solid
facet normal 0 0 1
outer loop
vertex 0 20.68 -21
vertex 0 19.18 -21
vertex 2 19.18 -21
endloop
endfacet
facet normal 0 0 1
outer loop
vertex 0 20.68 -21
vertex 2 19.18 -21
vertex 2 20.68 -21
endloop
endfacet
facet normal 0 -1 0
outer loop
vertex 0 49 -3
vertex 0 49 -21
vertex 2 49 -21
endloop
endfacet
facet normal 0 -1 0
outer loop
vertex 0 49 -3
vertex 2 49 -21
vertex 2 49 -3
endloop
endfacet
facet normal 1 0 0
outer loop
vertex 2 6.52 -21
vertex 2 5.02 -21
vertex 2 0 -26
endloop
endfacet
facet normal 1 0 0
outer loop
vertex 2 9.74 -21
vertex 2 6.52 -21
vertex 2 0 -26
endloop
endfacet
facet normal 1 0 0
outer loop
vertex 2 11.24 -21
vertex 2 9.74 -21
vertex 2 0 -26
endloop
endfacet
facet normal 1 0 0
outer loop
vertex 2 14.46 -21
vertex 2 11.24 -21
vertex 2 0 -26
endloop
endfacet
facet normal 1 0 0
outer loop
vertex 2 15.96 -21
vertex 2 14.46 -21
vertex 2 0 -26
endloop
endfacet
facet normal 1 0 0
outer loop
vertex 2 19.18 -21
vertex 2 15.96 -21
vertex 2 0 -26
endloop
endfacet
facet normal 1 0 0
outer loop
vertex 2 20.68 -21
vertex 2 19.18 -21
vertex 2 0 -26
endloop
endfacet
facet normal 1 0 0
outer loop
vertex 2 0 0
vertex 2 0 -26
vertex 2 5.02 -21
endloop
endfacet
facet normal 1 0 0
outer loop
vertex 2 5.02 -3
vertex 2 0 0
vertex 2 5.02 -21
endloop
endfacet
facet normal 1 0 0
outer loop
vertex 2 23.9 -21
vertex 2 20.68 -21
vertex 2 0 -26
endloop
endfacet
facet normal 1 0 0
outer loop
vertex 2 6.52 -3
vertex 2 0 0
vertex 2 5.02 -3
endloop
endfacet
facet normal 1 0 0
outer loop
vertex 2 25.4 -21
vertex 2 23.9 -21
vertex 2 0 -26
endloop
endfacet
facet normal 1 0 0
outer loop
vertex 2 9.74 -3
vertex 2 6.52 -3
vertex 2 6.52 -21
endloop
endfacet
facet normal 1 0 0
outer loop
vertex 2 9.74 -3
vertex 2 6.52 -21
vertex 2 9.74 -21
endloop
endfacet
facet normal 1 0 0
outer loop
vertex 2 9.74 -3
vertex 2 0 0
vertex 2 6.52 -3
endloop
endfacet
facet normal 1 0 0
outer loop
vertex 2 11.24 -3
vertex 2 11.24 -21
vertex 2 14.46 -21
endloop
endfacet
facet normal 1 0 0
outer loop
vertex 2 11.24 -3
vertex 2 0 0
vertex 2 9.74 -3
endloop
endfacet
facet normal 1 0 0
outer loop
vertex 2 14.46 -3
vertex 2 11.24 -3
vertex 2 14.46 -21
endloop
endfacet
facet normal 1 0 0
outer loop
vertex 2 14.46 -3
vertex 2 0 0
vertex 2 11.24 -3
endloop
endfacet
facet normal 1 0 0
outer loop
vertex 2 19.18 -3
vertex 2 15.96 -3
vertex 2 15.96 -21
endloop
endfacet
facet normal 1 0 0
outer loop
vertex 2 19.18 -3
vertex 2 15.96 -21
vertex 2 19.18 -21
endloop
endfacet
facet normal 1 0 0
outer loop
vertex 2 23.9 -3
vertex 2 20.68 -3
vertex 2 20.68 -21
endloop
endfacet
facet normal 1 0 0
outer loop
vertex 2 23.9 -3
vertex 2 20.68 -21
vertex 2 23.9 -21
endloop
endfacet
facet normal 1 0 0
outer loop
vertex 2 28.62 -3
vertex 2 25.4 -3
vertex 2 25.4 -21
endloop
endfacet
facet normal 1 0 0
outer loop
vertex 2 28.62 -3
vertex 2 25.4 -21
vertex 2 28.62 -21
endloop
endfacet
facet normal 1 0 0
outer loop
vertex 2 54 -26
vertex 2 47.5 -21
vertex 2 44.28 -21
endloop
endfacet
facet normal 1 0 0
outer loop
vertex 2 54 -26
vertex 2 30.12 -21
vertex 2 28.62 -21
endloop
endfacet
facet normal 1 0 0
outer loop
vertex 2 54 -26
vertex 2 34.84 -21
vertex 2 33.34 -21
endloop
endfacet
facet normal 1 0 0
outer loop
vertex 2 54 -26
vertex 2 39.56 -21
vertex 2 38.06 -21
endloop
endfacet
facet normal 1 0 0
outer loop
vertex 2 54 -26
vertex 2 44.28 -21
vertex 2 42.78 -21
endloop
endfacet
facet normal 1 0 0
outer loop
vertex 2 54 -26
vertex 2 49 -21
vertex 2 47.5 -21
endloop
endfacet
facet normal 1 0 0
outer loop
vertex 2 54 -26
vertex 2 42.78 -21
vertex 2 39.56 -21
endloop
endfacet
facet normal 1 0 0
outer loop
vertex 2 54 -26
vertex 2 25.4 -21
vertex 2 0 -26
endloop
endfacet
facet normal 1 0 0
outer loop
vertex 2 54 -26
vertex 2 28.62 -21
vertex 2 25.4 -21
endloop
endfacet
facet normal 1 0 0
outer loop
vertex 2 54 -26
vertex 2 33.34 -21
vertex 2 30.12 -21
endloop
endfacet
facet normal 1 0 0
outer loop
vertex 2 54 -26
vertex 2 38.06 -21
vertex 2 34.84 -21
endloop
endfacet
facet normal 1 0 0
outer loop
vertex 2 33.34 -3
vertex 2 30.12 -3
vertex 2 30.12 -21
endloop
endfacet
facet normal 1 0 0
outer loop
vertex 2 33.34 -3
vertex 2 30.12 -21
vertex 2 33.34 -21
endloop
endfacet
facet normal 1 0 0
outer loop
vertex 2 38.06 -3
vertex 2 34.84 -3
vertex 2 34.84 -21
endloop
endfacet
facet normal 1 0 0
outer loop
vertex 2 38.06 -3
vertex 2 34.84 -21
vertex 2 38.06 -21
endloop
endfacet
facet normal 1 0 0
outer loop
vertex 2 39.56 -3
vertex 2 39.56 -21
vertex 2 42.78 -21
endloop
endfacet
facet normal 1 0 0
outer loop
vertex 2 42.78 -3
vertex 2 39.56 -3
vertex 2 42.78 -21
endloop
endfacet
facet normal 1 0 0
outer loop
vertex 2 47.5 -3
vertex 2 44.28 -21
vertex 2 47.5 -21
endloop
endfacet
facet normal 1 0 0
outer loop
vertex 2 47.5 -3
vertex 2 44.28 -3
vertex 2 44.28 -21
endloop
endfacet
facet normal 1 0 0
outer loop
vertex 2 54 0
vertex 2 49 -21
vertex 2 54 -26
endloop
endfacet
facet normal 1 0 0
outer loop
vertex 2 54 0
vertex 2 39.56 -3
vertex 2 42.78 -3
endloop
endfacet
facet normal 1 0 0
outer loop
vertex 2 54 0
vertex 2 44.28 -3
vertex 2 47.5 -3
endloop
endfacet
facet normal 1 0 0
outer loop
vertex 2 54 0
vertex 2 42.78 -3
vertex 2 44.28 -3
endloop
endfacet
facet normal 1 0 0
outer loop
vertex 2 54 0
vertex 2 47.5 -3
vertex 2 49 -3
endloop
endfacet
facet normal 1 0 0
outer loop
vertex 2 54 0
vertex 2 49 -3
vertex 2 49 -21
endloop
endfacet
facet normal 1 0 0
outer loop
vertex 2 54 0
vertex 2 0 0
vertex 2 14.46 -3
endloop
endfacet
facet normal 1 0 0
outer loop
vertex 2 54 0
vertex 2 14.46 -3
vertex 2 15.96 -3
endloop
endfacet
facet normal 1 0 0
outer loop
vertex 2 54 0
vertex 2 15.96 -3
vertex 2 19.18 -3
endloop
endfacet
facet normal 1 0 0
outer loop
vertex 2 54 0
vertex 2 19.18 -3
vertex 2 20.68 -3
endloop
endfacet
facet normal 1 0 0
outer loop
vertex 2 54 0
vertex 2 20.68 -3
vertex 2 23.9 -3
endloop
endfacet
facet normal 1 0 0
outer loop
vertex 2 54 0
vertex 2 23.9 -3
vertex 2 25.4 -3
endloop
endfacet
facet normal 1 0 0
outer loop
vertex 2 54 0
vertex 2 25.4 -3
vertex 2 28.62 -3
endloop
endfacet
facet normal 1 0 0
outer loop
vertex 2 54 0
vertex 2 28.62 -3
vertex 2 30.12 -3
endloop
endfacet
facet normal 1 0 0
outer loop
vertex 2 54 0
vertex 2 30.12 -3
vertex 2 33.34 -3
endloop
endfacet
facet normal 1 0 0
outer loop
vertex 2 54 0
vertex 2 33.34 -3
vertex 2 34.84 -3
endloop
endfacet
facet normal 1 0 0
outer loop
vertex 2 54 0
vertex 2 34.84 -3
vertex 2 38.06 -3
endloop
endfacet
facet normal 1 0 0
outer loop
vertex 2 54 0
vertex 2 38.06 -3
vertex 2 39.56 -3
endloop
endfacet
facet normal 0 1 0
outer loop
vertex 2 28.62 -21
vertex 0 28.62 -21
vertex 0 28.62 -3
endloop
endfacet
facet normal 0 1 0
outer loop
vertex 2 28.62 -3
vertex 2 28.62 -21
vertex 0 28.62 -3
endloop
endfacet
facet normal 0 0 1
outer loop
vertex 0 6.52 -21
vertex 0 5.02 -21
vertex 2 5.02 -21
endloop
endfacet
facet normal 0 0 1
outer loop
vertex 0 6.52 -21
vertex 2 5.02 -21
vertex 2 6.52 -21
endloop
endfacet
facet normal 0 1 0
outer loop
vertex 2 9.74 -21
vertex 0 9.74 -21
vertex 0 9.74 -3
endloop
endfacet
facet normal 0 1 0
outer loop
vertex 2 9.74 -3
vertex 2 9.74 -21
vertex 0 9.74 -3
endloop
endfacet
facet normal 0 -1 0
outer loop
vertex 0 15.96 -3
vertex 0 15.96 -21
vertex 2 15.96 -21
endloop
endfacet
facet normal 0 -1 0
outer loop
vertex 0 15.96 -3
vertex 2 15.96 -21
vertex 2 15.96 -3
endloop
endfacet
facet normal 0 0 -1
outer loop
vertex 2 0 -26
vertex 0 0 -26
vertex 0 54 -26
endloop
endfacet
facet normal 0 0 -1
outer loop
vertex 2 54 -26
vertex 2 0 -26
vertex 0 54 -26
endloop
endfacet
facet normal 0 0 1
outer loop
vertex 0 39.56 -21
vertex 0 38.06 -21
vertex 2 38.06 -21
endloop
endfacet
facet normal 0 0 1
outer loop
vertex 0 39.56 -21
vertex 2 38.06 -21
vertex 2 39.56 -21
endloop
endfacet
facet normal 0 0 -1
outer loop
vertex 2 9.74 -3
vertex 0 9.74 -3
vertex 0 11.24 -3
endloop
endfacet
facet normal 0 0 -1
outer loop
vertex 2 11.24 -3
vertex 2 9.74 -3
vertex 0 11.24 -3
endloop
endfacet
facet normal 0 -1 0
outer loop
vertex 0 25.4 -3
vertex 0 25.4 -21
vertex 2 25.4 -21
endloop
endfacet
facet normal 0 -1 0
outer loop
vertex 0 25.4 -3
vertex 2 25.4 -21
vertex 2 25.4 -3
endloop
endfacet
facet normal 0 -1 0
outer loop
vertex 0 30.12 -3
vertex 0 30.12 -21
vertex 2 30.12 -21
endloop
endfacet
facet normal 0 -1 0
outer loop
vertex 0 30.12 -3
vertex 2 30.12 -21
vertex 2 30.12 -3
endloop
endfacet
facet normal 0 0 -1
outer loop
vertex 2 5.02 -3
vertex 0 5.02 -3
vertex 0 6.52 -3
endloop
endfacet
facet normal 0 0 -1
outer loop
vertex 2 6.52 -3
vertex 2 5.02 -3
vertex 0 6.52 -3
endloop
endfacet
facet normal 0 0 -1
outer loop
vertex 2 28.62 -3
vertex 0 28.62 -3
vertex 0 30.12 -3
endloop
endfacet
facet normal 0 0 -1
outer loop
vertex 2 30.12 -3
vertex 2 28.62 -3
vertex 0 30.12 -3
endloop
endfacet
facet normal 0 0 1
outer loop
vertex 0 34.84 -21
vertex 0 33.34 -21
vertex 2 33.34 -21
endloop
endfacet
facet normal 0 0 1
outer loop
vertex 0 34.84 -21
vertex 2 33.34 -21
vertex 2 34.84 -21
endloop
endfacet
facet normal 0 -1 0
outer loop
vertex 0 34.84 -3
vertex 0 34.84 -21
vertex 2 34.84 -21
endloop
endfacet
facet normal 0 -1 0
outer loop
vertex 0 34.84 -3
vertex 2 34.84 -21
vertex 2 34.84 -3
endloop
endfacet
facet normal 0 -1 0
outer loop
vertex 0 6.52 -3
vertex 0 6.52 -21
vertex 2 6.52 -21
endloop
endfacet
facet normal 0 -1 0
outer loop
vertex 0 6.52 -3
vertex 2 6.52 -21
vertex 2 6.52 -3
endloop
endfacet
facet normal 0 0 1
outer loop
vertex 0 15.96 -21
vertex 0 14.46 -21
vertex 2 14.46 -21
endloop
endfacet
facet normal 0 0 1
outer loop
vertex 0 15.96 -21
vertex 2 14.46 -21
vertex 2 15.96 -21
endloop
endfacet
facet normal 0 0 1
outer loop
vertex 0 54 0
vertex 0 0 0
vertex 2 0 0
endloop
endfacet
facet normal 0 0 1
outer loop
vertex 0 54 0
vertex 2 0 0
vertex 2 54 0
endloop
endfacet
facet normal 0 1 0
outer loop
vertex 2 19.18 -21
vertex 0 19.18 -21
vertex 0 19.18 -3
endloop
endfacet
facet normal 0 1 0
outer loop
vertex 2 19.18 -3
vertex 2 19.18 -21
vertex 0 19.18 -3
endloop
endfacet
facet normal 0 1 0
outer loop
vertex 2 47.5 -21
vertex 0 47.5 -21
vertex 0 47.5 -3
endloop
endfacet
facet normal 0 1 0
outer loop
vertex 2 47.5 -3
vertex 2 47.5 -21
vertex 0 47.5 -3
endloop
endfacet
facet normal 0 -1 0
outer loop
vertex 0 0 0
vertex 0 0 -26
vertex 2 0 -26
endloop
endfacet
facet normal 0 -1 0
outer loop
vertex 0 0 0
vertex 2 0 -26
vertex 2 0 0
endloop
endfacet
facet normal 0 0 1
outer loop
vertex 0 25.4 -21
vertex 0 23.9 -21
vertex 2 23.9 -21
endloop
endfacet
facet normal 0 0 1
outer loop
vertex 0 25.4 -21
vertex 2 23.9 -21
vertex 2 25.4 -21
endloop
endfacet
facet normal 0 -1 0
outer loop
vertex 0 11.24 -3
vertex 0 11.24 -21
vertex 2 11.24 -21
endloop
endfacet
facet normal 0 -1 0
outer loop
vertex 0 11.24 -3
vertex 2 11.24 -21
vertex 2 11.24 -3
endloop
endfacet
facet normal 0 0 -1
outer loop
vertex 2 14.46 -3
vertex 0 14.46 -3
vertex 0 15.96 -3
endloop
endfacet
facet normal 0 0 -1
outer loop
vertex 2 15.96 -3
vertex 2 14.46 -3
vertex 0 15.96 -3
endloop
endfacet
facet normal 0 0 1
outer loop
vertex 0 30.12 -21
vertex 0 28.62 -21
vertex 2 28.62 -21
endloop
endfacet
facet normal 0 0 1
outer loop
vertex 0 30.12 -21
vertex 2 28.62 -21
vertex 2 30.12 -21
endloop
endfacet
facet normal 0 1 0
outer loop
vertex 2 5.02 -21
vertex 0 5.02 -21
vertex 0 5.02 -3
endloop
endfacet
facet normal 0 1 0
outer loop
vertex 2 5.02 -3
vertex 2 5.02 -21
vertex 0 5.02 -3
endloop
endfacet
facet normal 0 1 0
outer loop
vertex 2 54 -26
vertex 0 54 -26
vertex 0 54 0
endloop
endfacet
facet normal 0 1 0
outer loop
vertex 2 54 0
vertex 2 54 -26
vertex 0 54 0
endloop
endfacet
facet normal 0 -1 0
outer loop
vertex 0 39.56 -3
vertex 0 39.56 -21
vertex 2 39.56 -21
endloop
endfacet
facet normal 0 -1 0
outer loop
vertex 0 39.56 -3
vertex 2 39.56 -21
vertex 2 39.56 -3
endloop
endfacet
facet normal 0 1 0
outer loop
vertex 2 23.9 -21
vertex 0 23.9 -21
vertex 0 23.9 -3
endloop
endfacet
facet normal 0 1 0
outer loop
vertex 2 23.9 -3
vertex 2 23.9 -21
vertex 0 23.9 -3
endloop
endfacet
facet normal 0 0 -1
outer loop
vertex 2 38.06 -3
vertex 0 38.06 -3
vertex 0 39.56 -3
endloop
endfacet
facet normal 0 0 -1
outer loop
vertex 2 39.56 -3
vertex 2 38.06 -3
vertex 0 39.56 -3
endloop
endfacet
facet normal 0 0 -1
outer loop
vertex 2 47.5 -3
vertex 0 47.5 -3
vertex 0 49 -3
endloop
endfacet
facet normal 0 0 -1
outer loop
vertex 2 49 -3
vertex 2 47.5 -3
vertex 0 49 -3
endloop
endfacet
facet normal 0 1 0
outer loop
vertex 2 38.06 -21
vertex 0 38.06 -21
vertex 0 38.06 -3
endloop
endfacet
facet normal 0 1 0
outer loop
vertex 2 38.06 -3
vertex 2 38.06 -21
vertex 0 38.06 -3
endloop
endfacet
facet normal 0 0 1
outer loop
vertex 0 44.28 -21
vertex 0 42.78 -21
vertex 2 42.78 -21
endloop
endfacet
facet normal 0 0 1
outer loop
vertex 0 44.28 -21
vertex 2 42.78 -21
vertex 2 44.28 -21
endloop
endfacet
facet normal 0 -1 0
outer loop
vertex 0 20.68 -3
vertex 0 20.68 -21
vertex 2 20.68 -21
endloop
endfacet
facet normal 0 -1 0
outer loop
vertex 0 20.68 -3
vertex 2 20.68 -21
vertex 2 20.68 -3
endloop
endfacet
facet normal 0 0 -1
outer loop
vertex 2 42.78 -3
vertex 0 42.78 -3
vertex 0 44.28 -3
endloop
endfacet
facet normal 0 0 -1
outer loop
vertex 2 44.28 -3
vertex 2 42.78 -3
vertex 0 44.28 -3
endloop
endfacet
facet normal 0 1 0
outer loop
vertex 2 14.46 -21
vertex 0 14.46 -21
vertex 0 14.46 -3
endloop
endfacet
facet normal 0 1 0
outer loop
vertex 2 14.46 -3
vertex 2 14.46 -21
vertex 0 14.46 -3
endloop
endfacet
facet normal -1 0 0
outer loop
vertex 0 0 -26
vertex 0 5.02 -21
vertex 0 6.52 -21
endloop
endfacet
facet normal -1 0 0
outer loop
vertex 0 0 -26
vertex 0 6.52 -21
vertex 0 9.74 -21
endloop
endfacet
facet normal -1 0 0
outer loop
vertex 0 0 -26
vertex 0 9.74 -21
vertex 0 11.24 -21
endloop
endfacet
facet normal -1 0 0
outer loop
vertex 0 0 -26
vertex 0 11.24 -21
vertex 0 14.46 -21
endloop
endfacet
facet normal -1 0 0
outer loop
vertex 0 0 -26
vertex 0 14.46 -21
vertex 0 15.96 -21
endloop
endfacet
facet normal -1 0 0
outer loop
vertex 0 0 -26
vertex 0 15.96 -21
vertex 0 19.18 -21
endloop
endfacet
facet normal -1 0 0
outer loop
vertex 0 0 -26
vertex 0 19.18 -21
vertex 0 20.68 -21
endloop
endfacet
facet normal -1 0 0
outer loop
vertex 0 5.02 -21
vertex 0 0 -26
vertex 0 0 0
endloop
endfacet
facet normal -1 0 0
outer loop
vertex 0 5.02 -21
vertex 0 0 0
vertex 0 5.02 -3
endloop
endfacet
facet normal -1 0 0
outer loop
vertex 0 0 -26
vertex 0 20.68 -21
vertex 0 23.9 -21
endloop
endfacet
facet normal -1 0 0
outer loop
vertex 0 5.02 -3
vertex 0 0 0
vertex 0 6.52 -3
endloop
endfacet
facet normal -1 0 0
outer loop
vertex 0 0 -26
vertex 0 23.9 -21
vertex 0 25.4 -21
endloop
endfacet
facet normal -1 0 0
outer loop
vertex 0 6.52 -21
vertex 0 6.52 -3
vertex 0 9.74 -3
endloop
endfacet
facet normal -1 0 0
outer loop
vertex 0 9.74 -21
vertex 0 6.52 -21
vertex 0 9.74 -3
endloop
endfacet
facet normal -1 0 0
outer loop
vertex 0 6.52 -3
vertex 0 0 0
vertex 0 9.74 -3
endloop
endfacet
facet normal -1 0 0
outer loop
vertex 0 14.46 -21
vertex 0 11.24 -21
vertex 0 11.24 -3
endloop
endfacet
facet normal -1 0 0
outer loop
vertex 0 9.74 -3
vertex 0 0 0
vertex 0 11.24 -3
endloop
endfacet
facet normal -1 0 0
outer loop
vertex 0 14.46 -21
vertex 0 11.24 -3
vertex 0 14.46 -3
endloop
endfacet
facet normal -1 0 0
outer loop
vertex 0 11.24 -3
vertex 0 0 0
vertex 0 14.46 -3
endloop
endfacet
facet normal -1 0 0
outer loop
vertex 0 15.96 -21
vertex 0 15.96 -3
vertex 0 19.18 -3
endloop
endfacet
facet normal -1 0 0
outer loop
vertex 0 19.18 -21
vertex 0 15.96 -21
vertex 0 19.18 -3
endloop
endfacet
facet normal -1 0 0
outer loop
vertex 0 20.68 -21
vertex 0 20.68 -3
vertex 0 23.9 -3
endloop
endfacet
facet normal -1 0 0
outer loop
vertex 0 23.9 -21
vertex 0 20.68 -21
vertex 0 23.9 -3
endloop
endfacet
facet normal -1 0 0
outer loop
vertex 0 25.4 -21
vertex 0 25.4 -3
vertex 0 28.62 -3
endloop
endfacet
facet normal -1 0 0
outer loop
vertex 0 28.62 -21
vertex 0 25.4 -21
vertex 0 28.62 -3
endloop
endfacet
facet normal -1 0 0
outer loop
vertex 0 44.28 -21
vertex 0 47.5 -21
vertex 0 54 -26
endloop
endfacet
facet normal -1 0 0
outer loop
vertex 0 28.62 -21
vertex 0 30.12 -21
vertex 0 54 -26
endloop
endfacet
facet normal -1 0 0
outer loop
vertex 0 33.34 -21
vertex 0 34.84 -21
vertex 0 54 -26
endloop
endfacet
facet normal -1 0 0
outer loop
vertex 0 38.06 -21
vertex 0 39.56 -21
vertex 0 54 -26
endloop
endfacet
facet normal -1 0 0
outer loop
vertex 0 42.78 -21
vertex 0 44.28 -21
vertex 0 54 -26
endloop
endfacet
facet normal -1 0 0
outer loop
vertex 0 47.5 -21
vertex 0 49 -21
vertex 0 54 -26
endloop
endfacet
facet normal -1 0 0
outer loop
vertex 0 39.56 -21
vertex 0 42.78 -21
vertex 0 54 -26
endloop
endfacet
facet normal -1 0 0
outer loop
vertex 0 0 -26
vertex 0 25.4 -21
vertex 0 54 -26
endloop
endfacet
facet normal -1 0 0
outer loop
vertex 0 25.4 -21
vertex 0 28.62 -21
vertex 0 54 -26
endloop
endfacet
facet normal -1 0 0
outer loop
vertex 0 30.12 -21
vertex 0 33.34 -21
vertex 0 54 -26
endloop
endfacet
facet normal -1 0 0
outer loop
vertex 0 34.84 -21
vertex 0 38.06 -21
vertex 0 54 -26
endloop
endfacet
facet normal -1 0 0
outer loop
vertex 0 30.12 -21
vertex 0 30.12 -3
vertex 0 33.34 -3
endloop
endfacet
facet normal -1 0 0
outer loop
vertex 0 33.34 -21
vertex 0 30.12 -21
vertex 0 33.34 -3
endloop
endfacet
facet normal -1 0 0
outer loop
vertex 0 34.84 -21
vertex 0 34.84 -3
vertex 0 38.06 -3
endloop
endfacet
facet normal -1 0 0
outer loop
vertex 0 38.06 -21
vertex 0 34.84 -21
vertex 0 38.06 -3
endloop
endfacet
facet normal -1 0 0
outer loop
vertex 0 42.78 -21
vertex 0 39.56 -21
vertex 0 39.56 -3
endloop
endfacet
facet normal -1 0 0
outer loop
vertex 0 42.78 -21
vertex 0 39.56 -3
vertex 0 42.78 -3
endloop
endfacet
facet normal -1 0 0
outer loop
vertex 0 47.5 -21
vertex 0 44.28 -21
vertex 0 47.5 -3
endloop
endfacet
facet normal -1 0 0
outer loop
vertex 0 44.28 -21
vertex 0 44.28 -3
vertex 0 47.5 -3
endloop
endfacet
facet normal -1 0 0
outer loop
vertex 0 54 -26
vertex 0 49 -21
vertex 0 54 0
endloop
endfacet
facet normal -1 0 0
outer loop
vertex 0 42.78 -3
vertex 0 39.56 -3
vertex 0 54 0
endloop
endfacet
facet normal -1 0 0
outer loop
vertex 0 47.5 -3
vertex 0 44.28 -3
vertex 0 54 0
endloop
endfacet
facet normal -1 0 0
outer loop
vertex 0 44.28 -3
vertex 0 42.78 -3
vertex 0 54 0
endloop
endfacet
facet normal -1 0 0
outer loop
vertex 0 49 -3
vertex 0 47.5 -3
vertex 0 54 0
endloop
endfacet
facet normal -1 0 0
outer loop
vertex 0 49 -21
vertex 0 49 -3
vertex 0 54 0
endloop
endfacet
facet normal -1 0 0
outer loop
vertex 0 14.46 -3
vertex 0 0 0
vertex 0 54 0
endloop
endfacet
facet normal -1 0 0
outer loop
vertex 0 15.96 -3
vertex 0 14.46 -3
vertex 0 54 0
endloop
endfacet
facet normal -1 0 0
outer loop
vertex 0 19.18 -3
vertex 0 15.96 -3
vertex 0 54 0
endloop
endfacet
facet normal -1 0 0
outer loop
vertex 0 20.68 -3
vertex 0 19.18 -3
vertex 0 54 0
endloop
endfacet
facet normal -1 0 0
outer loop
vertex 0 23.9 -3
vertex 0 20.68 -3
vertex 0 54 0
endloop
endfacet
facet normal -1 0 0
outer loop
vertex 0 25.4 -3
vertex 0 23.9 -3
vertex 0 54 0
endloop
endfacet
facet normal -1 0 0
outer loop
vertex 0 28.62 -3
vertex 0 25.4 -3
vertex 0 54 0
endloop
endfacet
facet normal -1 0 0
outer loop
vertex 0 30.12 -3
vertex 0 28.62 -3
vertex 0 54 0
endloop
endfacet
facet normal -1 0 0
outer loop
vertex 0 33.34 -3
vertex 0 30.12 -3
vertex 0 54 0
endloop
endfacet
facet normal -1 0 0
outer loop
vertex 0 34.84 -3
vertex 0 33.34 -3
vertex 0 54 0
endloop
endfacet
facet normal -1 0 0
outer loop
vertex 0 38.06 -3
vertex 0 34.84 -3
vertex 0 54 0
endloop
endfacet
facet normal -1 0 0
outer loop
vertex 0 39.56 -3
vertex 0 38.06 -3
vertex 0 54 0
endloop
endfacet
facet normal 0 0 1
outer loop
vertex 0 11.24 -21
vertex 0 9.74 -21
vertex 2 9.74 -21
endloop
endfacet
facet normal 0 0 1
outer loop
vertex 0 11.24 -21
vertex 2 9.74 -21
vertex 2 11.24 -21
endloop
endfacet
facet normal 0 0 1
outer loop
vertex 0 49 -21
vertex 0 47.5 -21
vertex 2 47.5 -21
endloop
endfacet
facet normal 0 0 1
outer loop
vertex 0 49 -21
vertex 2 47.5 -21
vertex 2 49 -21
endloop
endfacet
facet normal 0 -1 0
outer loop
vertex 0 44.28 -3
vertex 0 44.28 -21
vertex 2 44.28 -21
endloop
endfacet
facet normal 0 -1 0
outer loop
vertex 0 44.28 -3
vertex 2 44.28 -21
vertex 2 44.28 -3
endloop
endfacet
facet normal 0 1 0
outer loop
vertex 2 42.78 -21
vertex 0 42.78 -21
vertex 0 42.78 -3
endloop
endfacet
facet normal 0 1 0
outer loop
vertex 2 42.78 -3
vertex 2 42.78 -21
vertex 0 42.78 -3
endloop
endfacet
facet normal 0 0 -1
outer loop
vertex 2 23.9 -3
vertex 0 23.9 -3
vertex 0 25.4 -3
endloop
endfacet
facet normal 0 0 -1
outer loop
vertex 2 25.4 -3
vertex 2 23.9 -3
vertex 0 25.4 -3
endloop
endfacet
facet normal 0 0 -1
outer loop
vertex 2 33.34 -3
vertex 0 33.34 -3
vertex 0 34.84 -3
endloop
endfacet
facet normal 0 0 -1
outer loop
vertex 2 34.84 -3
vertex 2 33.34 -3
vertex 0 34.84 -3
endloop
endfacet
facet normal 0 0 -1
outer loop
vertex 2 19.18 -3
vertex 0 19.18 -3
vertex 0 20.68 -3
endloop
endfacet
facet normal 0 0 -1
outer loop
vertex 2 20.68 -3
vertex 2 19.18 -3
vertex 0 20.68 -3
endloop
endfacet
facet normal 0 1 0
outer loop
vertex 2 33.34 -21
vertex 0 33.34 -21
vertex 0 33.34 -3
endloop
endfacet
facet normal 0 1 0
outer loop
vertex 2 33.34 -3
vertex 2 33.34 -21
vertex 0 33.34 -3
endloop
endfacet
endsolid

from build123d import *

# Parameters (mm, degrees)
F0_W     = 54
F0_H     = 26
F0_W_2   = 1.5
F0_H_2   = 18
F1_DEPTH = 2


with BuildPart() as f1:
    # F0 (on Right) → F1 (new body)
    with BuildSketch(Plane.YZ):
        with Locations((27, -13)):
            Rectangle(F0_W, F0_H)
        with Locations((5.77, -12)):
            Rectangle(F0_W_2, F0_H_2, mode=Mode.SUBTRACT)
        with Locations((10.49, -12)):
            Rectangle(F0_W_2, F0_H_2, mode=Mode.SUBTRACT)
        with Locations((15.21, -12)):
            Rectangle(F0_W_2, F0_H_2, mode=Mode.SUBTRACT)
        with Locations((19.93, -12)):
            Rectangle(F0_W_2, F0_H_2, mode=Mode.SUBTRACT)
        with Locations((24.65, -12)):
            Rectangle(F0_W_2, F0_H_2, mode=Mode.SUBTRACT)
        with Locations((29.37, -12)):
            Rectangle(F0_W_2, F0_H_2, mode=Mode.SUBTRACT)
        with Locations((34.09, -12)):
            Rectangle(F0_W_2, F0_H_2, mode=Mode.SUBTRACT)
        with Locations((38.81, -12)):
            Rectangle(F0_W_2, F0_H_2, mode=Mode.SUBTRACT)
        with Locations((43.53, -12)):
            Rectangle(F0_W_2, F0_H_2, mode=Mode.SUBTRACT)
        with Locations((48.25, -12)):
            Rectangle(F0_W_2, F0_H_2, mode=Mode.SUBTRACT)
    extrude(amount=F1_DEPTH)


solid = f1.part
